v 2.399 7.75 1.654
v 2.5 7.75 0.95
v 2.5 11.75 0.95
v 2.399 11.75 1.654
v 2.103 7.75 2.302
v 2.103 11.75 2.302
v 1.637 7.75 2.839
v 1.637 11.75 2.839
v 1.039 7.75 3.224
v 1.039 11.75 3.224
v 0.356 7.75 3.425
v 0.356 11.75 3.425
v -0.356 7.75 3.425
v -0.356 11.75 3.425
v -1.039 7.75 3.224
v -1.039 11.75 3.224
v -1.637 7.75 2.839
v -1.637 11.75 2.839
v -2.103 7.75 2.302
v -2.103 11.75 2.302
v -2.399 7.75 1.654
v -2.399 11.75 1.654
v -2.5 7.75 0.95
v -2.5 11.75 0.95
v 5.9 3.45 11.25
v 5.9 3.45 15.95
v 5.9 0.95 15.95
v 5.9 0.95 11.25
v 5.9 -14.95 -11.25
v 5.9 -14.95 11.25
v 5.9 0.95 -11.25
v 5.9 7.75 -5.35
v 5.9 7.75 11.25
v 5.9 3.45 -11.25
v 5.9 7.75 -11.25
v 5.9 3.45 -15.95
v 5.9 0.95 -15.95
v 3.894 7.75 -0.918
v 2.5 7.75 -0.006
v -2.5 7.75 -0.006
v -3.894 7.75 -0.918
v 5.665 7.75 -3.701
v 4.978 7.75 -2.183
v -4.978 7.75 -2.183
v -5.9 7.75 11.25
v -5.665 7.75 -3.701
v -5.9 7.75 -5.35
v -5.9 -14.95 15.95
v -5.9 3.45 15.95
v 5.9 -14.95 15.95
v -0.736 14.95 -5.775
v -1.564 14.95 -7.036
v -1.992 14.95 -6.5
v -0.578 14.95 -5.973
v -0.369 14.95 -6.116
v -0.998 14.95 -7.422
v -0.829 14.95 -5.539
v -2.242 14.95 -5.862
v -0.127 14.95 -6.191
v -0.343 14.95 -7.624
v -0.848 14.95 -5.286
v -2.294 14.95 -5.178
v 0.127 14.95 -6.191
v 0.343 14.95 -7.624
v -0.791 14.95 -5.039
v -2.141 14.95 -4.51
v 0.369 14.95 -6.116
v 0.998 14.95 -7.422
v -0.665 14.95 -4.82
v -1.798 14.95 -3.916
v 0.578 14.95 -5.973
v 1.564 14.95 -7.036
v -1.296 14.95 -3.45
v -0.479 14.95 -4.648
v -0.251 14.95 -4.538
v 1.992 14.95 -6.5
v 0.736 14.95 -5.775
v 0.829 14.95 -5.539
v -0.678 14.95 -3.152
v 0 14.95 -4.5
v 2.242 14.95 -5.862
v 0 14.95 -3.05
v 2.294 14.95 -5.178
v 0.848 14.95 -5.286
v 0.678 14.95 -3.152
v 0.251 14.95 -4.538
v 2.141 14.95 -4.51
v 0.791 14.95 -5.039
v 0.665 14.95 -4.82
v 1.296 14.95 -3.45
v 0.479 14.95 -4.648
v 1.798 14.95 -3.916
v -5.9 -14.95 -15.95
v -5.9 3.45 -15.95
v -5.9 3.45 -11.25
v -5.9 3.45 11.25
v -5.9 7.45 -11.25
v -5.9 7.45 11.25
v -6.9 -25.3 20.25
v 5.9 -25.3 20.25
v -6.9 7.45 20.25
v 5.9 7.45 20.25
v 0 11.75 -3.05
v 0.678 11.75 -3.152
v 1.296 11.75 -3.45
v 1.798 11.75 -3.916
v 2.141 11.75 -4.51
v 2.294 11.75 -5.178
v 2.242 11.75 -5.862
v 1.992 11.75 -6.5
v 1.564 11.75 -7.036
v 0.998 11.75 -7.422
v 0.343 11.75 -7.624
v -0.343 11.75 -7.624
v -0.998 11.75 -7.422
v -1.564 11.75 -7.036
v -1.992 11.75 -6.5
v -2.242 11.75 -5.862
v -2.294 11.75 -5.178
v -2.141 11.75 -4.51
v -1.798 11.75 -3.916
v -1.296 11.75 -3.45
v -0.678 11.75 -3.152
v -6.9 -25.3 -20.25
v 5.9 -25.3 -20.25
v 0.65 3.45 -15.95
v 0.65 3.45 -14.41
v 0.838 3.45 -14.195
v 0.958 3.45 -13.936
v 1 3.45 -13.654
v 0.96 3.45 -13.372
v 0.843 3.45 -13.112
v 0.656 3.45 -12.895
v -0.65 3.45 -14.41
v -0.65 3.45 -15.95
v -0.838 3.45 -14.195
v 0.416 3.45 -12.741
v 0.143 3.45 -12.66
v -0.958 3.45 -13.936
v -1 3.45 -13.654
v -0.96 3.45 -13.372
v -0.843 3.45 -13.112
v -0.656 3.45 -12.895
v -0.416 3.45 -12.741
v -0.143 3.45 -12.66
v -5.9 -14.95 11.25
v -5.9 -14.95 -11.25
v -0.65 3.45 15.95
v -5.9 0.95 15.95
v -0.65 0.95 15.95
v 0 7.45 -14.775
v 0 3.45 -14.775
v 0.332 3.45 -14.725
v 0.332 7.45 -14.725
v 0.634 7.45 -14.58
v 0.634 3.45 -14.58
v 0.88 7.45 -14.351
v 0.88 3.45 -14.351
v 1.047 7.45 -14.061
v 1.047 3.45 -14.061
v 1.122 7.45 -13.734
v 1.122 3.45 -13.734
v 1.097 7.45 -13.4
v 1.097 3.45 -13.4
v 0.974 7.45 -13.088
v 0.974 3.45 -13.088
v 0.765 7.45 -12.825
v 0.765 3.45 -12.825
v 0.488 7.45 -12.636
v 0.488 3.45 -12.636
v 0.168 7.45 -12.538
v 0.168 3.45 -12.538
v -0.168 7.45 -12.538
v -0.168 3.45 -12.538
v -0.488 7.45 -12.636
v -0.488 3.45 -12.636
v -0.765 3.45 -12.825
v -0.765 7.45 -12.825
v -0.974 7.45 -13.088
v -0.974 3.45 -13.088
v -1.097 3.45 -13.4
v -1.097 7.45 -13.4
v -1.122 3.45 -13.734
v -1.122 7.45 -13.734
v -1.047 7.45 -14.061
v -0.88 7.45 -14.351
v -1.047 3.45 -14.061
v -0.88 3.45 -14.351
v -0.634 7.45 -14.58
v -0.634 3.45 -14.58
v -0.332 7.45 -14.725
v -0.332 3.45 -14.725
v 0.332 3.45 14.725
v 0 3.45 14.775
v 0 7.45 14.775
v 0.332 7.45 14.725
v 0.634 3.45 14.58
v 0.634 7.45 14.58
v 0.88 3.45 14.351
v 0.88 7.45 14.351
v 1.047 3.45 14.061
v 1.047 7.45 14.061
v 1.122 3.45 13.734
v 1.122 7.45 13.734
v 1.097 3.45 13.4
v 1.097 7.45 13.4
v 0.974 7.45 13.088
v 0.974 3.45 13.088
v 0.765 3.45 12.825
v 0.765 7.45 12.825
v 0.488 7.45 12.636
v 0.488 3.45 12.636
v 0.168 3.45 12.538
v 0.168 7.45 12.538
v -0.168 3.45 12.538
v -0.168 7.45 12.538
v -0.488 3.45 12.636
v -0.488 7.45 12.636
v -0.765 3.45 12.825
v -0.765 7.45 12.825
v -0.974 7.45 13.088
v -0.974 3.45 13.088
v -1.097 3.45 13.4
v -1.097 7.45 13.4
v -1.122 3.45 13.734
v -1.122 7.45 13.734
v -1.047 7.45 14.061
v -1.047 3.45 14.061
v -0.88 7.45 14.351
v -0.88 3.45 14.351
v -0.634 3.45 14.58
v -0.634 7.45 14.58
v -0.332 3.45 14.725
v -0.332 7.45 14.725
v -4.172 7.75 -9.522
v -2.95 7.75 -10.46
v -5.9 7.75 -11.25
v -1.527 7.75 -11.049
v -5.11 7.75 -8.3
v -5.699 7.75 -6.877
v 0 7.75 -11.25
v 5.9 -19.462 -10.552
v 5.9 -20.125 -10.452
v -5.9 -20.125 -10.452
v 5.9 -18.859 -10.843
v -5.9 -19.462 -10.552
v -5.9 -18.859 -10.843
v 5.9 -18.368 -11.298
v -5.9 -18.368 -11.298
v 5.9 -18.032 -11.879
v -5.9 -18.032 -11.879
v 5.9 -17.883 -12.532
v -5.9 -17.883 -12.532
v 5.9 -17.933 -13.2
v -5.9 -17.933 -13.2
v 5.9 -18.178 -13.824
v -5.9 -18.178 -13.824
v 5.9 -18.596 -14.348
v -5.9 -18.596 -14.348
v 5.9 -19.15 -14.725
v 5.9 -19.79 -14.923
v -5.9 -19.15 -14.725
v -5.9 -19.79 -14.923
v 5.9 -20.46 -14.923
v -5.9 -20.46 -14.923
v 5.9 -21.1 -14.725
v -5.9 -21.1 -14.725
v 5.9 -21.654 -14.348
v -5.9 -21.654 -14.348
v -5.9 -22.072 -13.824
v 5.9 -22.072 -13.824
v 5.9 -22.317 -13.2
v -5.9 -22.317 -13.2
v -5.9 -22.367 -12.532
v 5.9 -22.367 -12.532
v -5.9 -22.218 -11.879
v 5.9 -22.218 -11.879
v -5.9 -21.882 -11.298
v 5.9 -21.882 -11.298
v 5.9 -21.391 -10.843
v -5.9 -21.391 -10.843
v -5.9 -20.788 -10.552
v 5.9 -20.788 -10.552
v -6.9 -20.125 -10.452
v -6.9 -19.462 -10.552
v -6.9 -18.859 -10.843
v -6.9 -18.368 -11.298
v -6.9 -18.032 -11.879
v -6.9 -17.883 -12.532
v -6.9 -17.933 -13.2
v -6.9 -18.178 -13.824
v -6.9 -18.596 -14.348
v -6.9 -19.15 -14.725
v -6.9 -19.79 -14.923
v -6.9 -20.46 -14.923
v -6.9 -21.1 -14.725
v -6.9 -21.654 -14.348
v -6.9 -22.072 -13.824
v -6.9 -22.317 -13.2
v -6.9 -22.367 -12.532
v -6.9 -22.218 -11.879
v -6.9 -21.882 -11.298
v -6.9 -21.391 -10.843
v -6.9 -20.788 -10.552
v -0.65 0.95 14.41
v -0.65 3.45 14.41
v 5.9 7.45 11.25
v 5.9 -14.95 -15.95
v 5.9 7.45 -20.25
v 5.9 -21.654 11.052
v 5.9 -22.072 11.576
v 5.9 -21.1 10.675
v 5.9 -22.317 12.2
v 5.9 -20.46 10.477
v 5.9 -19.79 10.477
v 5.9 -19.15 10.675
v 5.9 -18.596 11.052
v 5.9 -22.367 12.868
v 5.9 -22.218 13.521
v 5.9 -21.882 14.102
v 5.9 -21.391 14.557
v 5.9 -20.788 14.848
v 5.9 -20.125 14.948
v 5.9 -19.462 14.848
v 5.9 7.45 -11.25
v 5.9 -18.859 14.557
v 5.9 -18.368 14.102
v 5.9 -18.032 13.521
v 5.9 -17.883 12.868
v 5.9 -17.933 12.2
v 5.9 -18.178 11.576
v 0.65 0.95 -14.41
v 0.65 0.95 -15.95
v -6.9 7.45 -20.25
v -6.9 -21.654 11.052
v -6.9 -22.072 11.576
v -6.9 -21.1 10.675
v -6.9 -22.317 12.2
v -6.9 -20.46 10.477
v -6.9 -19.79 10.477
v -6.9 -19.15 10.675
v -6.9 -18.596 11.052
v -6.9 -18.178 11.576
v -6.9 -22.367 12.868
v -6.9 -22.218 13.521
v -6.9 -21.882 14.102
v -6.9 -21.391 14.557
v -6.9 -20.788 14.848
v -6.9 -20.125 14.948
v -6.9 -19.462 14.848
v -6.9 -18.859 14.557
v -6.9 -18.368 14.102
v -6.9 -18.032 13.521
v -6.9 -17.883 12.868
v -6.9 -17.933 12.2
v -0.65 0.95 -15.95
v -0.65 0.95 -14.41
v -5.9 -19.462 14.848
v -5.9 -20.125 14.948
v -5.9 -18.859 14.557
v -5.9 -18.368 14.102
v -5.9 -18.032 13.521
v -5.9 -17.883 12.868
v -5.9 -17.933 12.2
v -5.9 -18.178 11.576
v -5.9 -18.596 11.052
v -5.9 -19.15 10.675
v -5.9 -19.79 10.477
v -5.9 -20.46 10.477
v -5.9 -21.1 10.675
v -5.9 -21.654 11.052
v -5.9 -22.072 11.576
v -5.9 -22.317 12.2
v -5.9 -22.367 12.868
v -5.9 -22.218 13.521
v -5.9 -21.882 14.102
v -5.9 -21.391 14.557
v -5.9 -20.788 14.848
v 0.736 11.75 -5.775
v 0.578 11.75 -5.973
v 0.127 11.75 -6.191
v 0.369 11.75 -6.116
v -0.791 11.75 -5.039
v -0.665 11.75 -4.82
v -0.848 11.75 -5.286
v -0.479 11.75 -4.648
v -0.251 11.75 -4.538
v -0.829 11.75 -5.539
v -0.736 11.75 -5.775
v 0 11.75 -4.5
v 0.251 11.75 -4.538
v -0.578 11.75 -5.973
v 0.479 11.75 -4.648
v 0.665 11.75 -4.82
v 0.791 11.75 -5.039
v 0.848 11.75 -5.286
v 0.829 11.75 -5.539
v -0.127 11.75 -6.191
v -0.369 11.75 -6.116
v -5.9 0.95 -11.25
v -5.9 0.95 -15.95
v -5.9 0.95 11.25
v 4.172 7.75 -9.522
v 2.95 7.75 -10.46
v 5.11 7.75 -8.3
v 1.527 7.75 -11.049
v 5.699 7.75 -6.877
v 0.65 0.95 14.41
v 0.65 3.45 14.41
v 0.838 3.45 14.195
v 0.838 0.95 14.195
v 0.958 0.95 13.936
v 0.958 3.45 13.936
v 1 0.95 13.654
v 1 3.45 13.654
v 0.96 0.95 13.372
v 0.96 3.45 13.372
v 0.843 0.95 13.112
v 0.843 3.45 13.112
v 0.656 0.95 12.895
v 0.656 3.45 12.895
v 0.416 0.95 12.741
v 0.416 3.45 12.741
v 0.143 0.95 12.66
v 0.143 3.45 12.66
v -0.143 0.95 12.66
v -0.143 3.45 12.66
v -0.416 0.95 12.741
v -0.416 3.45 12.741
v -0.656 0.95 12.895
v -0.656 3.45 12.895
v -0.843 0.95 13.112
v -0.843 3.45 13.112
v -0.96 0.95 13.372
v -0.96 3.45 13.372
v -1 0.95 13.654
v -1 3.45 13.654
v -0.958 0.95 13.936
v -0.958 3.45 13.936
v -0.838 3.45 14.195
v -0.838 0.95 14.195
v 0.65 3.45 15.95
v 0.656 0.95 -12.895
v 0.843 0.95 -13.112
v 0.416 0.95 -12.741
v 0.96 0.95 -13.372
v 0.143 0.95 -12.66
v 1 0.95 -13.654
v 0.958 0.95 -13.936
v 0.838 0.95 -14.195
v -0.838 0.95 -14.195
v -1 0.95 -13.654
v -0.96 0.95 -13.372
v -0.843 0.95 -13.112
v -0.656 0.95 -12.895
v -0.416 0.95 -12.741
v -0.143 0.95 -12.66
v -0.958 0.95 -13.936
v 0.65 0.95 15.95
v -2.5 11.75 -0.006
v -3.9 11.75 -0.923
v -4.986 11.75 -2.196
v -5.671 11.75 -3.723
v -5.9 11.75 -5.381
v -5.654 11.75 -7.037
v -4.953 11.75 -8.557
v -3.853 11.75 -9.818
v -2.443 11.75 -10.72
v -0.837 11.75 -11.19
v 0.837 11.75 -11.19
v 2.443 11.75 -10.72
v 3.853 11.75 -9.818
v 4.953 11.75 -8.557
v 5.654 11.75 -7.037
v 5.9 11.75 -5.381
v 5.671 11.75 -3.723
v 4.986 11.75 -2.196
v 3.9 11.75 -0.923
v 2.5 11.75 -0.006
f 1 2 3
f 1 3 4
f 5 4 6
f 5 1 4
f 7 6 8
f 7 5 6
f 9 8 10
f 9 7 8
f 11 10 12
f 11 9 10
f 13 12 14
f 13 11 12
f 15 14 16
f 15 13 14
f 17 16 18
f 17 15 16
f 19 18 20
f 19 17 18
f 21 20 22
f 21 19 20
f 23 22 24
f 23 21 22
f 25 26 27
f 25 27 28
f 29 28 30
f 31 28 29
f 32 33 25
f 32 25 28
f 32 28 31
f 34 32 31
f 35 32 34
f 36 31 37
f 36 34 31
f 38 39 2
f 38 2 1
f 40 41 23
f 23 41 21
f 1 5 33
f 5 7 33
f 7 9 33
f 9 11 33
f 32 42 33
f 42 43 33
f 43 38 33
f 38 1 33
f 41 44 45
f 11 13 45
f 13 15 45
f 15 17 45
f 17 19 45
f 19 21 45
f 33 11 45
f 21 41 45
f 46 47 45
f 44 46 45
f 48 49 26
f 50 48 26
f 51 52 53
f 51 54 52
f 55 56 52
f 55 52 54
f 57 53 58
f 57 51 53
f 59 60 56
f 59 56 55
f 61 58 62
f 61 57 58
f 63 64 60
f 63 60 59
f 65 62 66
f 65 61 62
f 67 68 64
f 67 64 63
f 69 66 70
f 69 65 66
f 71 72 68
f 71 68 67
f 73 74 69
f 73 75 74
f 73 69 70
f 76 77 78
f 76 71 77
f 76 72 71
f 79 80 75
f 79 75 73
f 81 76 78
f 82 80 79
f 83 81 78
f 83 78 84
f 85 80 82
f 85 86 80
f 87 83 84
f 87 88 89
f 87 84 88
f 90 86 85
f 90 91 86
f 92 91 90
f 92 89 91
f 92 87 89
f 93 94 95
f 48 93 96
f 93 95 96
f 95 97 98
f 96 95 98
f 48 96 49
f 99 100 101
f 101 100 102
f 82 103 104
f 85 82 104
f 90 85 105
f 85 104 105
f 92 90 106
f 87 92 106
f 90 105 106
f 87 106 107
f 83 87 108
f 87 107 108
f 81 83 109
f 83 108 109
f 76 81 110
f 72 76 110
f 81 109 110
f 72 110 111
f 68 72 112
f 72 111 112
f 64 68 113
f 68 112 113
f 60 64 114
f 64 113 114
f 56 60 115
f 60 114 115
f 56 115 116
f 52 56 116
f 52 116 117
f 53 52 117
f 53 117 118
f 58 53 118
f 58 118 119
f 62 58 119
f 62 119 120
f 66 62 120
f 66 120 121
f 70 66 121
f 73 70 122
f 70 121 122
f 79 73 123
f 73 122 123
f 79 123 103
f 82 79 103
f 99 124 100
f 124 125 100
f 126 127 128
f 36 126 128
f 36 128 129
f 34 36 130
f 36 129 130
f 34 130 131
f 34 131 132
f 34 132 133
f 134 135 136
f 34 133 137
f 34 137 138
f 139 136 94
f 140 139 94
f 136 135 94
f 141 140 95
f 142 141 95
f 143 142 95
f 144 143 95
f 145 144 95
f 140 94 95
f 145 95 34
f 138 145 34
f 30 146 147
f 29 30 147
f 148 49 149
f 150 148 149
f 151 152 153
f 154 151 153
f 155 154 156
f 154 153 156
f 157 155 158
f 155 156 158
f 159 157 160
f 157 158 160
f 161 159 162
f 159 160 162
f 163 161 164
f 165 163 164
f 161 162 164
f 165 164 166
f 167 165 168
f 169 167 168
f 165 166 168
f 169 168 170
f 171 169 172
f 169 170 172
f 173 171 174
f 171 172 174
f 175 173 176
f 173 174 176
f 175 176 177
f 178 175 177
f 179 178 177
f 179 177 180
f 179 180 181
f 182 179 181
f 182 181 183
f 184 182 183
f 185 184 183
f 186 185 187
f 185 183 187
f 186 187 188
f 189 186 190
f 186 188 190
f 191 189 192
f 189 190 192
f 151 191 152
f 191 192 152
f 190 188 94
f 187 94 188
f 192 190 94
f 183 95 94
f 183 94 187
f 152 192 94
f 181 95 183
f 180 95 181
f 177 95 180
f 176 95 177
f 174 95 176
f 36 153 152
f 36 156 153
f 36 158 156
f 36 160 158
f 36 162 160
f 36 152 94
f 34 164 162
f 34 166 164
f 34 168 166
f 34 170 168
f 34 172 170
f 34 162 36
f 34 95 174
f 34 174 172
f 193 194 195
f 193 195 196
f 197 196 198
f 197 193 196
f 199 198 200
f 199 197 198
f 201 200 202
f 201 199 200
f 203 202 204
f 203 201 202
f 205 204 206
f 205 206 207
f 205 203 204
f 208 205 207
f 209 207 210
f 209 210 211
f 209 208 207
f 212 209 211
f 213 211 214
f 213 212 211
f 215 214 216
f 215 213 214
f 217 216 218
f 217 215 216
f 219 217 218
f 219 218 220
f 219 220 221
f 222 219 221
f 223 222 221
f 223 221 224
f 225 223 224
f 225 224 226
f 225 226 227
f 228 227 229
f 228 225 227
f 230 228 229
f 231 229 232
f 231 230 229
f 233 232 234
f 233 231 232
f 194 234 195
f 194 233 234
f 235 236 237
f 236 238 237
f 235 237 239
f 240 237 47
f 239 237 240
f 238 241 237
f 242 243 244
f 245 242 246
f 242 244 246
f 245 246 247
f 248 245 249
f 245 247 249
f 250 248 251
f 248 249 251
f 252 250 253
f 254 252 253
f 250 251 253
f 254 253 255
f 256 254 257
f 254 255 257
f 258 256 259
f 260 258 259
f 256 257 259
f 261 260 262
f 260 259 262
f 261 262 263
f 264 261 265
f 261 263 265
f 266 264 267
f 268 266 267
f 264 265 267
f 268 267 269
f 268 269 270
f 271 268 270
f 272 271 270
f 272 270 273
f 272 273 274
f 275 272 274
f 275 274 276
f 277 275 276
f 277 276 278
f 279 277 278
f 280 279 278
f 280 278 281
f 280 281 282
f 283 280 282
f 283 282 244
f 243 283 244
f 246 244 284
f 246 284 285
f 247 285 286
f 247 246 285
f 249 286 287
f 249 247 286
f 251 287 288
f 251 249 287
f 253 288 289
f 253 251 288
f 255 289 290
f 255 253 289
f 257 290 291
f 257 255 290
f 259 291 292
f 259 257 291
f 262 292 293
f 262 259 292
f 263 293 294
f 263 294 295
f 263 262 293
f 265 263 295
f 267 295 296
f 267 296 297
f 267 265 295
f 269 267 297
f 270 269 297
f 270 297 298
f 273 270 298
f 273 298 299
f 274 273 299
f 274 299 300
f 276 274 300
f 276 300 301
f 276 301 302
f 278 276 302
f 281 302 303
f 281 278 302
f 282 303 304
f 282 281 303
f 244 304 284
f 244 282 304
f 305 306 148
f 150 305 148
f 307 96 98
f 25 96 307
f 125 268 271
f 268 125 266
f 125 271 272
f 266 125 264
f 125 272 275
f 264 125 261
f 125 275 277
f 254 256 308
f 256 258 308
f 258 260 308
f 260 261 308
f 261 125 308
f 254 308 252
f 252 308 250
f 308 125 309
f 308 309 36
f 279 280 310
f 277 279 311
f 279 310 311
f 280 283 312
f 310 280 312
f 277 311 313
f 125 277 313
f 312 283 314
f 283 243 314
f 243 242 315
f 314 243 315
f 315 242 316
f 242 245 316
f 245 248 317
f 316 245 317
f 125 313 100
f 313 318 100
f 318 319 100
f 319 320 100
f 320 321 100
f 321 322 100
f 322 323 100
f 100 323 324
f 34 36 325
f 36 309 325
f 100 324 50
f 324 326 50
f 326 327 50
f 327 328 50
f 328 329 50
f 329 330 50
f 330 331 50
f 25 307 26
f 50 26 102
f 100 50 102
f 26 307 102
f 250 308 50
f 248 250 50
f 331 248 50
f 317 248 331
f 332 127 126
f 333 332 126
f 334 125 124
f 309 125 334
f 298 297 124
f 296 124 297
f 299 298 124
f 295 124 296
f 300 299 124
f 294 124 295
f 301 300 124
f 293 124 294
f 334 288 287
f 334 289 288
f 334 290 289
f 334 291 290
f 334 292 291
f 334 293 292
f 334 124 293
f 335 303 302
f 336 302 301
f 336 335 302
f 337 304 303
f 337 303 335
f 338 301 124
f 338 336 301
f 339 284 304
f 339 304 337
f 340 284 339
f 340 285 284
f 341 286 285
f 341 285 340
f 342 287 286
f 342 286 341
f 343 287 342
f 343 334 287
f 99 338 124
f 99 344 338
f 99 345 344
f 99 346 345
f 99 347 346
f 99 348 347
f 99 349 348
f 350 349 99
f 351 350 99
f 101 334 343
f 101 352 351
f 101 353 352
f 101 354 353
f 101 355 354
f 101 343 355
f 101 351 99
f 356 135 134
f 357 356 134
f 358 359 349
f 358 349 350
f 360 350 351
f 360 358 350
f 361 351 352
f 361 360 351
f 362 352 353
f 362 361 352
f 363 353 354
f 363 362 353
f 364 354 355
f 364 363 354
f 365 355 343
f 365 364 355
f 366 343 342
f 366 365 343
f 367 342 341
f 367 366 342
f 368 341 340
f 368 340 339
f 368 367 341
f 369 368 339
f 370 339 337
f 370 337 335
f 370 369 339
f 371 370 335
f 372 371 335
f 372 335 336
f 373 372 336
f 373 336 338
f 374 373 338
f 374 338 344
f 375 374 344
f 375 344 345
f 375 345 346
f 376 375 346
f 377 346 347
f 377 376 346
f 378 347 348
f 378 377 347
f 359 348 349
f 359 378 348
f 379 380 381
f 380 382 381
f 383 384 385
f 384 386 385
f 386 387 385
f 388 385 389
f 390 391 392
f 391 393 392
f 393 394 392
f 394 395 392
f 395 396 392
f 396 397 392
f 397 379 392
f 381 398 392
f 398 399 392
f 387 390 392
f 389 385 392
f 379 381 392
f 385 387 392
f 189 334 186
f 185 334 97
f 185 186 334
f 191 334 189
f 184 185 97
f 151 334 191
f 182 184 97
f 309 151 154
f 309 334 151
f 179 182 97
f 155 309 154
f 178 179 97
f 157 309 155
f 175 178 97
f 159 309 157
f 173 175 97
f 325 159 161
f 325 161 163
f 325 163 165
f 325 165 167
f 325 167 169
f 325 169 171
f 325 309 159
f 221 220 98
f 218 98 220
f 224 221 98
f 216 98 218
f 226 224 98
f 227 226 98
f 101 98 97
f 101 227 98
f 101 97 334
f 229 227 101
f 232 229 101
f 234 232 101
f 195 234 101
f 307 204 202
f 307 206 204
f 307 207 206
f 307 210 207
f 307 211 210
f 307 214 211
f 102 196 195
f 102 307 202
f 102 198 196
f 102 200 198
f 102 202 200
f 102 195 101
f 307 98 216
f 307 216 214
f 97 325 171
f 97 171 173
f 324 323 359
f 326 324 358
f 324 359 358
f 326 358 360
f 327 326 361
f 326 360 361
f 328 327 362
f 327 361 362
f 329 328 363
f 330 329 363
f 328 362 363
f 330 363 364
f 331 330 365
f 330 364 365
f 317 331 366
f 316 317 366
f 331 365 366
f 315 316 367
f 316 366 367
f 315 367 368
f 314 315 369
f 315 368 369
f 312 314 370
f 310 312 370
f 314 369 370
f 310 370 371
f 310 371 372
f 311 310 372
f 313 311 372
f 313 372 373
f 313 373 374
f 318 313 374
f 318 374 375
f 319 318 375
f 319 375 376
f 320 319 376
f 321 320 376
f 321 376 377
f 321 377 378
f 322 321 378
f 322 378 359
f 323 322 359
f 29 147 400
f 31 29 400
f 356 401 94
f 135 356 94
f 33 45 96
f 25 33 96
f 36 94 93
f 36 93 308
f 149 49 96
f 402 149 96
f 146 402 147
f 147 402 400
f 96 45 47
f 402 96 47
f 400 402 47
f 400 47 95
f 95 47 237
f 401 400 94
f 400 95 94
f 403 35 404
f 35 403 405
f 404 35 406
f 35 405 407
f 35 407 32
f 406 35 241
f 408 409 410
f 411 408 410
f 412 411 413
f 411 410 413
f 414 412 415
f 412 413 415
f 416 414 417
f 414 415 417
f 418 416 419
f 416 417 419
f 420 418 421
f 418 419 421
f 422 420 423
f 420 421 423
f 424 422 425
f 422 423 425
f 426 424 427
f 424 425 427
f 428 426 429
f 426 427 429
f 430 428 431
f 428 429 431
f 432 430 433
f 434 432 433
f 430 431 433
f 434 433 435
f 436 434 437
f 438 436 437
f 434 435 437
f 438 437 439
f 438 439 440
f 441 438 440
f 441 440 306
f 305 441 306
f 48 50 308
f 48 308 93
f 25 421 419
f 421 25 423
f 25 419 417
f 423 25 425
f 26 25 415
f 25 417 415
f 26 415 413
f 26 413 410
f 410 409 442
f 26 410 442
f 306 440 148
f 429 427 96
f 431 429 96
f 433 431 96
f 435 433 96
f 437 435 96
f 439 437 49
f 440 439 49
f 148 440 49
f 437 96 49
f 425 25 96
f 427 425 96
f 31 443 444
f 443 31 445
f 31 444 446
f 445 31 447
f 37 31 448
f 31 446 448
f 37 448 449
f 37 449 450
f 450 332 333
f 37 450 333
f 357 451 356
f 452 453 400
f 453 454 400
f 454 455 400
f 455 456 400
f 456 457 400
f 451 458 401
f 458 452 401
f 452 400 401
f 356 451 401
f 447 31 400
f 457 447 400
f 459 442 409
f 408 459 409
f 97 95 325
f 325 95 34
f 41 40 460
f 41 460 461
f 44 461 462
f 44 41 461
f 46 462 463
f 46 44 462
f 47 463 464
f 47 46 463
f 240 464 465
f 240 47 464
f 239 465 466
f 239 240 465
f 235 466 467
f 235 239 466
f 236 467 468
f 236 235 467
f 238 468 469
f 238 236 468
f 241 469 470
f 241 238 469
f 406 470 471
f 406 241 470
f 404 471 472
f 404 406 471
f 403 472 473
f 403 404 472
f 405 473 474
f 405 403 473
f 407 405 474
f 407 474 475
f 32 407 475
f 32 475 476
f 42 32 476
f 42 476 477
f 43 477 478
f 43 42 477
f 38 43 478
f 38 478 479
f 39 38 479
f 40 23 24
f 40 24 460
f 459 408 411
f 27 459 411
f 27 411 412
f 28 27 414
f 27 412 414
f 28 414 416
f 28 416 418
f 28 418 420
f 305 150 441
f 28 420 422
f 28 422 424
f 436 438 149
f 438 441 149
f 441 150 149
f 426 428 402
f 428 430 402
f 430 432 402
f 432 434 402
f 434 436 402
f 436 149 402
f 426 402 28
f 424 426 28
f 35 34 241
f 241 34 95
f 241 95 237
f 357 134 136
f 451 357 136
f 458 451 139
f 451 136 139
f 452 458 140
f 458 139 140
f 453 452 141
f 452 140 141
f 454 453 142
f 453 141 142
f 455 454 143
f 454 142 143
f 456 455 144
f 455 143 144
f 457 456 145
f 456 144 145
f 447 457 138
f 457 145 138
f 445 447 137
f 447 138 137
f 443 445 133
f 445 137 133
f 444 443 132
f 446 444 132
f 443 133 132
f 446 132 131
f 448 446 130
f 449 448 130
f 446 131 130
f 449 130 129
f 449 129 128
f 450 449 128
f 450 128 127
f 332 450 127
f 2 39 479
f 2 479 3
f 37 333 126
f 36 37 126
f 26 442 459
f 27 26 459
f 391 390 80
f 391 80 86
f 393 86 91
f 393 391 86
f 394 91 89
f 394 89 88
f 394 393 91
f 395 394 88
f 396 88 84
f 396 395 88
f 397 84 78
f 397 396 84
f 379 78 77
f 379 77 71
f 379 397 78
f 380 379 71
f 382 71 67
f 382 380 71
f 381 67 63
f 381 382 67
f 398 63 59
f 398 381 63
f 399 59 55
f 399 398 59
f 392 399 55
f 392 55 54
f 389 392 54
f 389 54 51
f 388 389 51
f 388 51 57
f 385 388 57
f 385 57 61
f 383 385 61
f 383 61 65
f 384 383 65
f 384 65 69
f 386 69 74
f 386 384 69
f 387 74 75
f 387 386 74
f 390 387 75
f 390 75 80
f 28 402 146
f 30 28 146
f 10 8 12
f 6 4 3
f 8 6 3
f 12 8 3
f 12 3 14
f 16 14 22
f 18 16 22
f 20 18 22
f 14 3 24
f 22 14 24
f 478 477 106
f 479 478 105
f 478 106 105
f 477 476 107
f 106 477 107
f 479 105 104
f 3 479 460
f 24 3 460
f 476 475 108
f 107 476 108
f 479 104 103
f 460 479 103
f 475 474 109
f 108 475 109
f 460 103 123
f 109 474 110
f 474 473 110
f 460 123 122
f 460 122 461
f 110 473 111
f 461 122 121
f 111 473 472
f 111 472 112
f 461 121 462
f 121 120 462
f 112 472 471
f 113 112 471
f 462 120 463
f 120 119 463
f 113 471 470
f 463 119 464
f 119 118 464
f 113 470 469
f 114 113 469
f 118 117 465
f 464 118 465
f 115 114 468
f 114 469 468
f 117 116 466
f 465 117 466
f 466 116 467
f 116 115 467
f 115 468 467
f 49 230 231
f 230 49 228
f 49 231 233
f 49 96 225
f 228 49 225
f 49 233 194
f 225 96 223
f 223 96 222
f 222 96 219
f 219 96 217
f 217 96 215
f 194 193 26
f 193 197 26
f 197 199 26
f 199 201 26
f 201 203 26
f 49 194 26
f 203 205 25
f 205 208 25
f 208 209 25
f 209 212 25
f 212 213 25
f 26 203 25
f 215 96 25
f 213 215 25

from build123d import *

# Parameters (mm, degrees)
BOSS_EXTRU_1_DEPTH      = 5.9
BOSS_EXTRU_1_DEPTH_BACK = 5.9
BOSS_EXTRU_2_DEPTH      = 4
ENL_V_MAT_EXTRU_1_DEPTH = 2.5
ESQUISSE4_R             = 2.3
ESQUISSE4_R_2           = 0.85
BOSS_EXTRU_3_DEPTH      = 3.2
SKETCH1_W               = 11.8
SKETCH1_H               = 9
SKETCH1_R               = 1.125
BOSS_EXTRUDE1_DEPTH     = 4
SKETCH3_W               = 11.8
SKETCH3_H               = 4.3
BOSS_EXTRUDE2_DEPTH     = 22.4
SKETCH5_W               = 11.8
SKETCH5_H               = 4
BOSS_EXTRUDE3_DEPTH     = 15.95
SKETCH6_W               = 11.8
SKETCH6_H               = 40.5
BOSS_EXTRUDE4_DEPTH     = 6.35
SKETCH7_R               = 2.2479
CUT_EXTRUDE1_DEPTH      = 35.487570225
SKETCH8_W               = 40.5
SKETCH8_H               = 32.75
SKETCH8_R               = 2.2479
BOSS_EXTRUDE5_DEPTH     = 1


with BuildPart() as part:
    # Esquisse1 → Boss.-Extru.1 (new, two sides: drawn at the far end of the back side and taken through both)
    with BuildSketch(Plane(origin=(0, 0, 0), x_dir=(0, 0, -1), z_dir=(1, 0, 0)).offset(-BOSS_EXTRU_1_DEPTH_BACK)):
        Polygon((-11.25, -14.95), (11.25, -14.95), (11.25, 0.95), (15.95, 0.95), (15.95, 3.45), (11.25, 3.45), (11.25, 7.75), (-11.25, 7.75), (-11.25, 3.45), (-15.95, 3.45), (-15.95, 0.95), (-11.25, 0.95), align=None)
    extrude(amount=BOSS_EXTRU_1_DEPTH + BOSS_EXTRU_1_DEPTH_BACK)

    # Esquisse2 → Boss.-Extru.2 (add)
    with BuildSketch(Plane(origin=(0, 7.75, 0), x_dir=(1, 0, 0), z_dir=(0, 1, 0))):
        with BuildLine():
            Line((-2.5, -0.95), (-2.5, 0.005844314))
            ThreePointArc((-2.5, 0.005844314), (0, 11.25), (2.5, 0.005844314))
            Line((2.5, 0.005844314), (2.5, -0.95))
            ThreePointArc((2.5, -0.95), (0, -3.45), (-2.5, -0.95))
        make_face()
    extrude(amount=BOSS_EXTRU_2_DEPTH)

    # Esquisse3 → Enlèv. mat.-Extru.1 (cut)
    with BuildSketch(Plane(origin=(0, 3.45, 0), x_dir=(1, 0, 0), z_dir=(0, 1, 0))):
        with BuildLine():
            Line((-0.65, 15.95), (-0.65, 14.409934208))
            ThreePointArc((-0.65, 14.409934208), (0, 12.65), (0.65, 14.409934208))
            Line((0.65, 14.409934208), (0.65, 15.95))
            Line((0.65, 15.95), (-0.65, 15.95))
        make_face()
        with BuildLine():
            Line((-0.65, -15.95), (0.65, -15.95))
            Line((0.65, -15.95), (0.65, -14.409934208))
            ThreePointArc((0.65, -14.409934208), (0, -12.65), (-0.65, -14.409934208))
            Line((-0.65, -14.409934208), (-0.65, -15.95))
        make_face()
    extrude(amount=-ENL_V_MAT_EXTRU_1_DEPTH, mode=Mode.SUBTRACT)

    # Esquisse4 → Boss.-Extru.3 (add)
    with BuildSketch(Plane(origin=(0, 11.75, 0), x_dir=(1, 0, 0), z_dir=(0, 1, 0))):
        with Locations(Location((0, 5.35, 0), (0, 0, 270))):
            Circle(ESQUISSE4_R)
        with Locations(Location((0, 5.35, 0), (0, 0, 270))):
            Circle(ESQUISSE4_R_2, mode=Mode.SUBTRACT)
    extrude(amount=BOSS_EXTRU_3_DEPTH)


with BuildPart() as body_2:
    # Sketch1 → Boss-Extrude1 (new body)
    with BuildSketch(Plane(origin=(0, 3.45, 0), x_dir=(1, 0, 0), z_dir=(0, 1, 0))):
        with Locations((0, -15.75)):
            Rectangle(SKETCH1_W, SKETCH1_H)
        with Locations(Location((0, -13.65, 0), (0, 0, 270))):
            Circle(SKETCH1_R, mode=Mode.SUBTRACT)
    boss_extrude1 = extrude(amount=BOSS_EXTRUDE1_DEPTH)


with BuildPart() as body_3:
    # Sketch3 → Boss-Extrude2 (new body)
    with BuildSketch(Plane.XZ.offset(-3.45)):
        with Locations((0, 18.1)):
            Rectangle(SKETCH3_W, SKETCH3_H)
    boss_extrude2 = extrude(amount=BOSS_EXTRUDE2_DEPTH)


with BuildPart() as body_4:
    # Sketch5 → Boss-Extrude3 (new body)
    with BuildSketch(Plane(origin=(0, 0, 15.95), x_dir=(-1, 0, 0), z_dir=(0, 0, -1))):
        with Locations((0, -16.95)):
            Rectangle(SKETCH5_W, SKETCH5_H)
    boss_extrude3 = extrude(amount=BOSS_EXTRUDE3_DEPTH)

    # Combine1: union body 3, body 2
    add(body_3.part)
    add(body_2.part)

    # Mirror3: Boss-Extrude1, Boss-Extrude2, Boss-Extrude3 across plane
    add(boss_extrude1.mirror(Plane(origin=(0, 0, 0), x_dir=(1, 0, 0), z_dir=(0, 0, -1))))
    add(boss_extrude2.mirror(Plane(origin=(0, 0, 0), x_dir=(1, 0, 0), z_dir=(0, 0, -1))))
    add(boss_extrude3.mirror(Plane(origin=(0, 0, 0), x_dir=(1, 0, 0), z_dir=(0, 0, -1))))

    # Sketch6 → Boss-Extrude4 (add)
    with BuildSketch(Plane.XZ.offset(18.95)):
        Rectangle(SKETCH6_W, SKETCH6_H)
    extrude(amount=BOSS_EXTRUDE4_DEPTH)

    # Sketch7 → Cut-Extrude1 (cut, through all)
    with BuildSketch(Plane.ZY.offset(5.9)):
        with Locations((12.7, -20.125)):
            Circle(SKETCH7_R)
        with Locations((-12.7, -20.125)):
            Circle(SKETCH7_R)
    extrude(amount=-CUT_EXTRUDE1_DEPTH, mode=Mode.SUBTRACT)

    # Sketch8 → Boss-Extrude5 (add)
    with BuildSketch(Plane.ZY.offset(5.9)):
        with Locations((0, -8.925)):
            Rectangle(SKETCH8_W, SKETCH8_H)
        with Locations((-12.7, -20.125)):
            Circle(SKETCH8_R, mode=Mode.SUBTRACT)
        with Locations((12.7, -20.125)):
            Circle(SKETCH8_R, mode=Mode.SUBTRACT)
    extrude(amount=BOSS_EXTRUDE5_DEPTH)


solid = Compound([part.part, body_4.part])
